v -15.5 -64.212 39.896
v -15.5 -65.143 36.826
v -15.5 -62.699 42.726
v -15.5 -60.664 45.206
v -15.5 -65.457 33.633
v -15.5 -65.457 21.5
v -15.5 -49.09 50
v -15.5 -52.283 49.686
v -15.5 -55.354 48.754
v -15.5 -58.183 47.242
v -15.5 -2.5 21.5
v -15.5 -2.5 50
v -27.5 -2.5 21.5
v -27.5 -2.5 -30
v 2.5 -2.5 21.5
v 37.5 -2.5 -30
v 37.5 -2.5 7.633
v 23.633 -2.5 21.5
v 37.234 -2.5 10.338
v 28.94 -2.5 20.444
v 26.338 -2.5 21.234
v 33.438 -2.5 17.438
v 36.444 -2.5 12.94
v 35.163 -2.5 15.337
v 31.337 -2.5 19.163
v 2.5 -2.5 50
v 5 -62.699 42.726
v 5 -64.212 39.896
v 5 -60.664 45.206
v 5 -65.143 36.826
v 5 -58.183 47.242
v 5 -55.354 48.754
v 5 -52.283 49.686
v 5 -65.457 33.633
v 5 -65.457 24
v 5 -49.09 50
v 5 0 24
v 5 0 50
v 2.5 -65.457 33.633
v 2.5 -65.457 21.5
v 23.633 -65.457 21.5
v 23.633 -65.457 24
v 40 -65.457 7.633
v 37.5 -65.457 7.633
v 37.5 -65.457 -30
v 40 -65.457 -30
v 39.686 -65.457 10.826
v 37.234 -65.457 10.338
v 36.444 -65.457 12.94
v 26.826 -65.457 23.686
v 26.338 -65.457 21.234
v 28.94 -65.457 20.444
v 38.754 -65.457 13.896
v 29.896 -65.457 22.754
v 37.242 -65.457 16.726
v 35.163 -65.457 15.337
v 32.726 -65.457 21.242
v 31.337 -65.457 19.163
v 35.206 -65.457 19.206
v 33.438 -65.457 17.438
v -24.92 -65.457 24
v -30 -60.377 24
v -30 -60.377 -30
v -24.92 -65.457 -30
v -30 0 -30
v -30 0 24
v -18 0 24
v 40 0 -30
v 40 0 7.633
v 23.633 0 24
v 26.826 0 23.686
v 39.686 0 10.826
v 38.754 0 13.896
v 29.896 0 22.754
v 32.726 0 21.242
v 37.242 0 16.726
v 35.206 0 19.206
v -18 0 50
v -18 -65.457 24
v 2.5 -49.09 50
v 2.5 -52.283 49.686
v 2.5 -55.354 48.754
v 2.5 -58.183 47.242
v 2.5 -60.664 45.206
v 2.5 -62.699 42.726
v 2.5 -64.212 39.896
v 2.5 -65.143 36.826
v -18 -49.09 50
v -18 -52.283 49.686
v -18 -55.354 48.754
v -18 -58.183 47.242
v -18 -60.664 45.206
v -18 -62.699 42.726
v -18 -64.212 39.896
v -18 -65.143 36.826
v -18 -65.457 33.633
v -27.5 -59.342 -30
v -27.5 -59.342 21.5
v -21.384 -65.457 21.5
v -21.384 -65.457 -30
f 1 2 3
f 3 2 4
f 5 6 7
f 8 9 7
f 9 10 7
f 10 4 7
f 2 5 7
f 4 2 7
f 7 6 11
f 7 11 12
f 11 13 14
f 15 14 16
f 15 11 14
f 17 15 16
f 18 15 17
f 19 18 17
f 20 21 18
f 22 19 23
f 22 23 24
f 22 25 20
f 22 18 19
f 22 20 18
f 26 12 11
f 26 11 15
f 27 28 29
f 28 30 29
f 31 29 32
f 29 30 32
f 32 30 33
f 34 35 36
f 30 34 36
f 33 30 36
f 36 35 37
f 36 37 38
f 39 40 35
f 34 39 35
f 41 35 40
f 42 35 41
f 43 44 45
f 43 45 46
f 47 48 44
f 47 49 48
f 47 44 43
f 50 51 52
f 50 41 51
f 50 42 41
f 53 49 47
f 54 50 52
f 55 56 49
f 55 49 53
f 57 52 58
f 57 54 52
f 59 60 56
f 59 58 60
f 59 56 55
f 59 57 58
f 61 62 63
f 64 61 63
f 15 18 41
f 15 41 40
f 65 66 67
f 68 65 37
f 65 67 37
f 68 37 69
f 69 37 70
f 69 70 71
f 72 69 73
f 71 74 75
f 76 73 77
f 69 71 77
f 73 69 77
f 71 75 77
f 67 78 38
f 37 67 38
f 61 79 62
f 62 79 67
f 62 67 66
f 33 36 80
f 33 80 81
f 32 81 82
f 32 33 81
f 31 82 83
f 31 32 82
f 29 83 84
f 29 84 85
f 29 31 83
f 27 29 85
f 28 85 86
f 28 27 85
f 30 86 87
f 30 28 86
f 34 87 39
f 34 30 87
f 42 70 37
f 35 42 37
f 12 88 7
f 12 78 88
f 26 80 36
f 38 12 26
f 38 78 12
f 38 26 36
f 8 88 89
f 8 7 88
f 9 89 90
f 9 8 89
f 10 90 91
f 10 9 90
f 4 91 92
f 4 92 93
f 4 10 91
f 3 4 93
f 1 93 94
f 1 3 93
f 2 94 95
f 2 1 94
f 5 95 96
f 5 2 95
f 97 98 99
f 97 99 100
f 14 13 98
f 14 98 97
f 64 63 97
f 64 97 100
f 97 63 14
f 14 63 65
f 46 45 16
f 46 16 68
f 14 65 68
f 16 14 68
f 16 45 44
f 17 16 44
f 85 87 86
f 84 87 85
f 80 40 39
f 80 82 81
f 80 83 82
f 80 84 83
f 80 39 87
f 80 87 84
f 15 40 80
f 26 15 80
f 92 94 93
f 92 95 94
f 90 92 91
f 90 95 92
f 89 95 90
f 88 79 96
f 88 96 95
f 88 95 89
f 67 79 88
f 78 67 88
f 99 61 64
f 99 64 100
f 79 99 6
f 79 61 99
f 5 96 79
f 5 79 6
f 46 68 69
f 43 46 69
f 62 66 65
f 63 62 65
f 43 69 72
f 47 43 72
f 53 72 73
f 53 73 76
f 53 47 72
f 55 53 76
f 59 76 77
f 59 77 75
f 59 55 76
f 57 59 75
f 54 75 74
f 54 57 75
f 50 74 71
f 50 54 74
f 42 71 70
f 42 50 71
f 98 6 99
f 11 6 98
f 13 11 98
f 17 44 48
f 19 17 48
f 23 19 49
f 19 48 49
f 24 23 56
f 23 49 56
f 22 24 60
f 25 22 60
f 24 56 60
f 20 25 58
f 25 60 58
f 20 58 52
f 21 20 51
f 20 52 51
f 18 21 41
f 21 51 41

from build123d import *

# Parameters (mm, degrees)
F0_W     = 23
F0_H     = 26
F1_DEPTH = 65.4574409127
F2_R     = 16.367035619
F3_SIZE  = 5.08
F4_T     = -2.5


with BuildPart() as f1:
    # F0 (on Front) → F1 (new body)
    with BuildSketch(Plane.XZ):
        Polygon((-18, 24), (-30, 24), (-30, -30), (40, -30), (40, 24), (5, 24), align=None)
        with Locations((-6.5, 37)):
            Rectangle(F0_W, F0_H)
    extrude(amount=F1_DEPTH)

    # F2
    f2_edges = [f1.edges().sort_by_distance(p)[0] for p in [
        (40, -32.72872, 24),
        (-6.5, -65.457441, 50),
    ]]
    fillet(f2_edges, radius=F2_R)

    # F3
    f3_edges = [f1.edges().sort_by_distance(p)[0] for p in [
        (-30, -65.457441, -3),
    ]]
    chamfer(f3_edges, length=F3_SIZE)

    # F4
    f4_openings = [f1.faces().sort_by_distance(p)[0] for p in [
        (5.094058, -32.641076, -30),
        (-6.5, -24.545203, 50),
        (-6.5, -60.663647, 45.206206),
        (6.241123, -65.457441, -1.444797),
    ]]
    offset(amount=F4_T, openings=f4_openings, kind=Kind.INTERSECTION)


solid = f1.part
